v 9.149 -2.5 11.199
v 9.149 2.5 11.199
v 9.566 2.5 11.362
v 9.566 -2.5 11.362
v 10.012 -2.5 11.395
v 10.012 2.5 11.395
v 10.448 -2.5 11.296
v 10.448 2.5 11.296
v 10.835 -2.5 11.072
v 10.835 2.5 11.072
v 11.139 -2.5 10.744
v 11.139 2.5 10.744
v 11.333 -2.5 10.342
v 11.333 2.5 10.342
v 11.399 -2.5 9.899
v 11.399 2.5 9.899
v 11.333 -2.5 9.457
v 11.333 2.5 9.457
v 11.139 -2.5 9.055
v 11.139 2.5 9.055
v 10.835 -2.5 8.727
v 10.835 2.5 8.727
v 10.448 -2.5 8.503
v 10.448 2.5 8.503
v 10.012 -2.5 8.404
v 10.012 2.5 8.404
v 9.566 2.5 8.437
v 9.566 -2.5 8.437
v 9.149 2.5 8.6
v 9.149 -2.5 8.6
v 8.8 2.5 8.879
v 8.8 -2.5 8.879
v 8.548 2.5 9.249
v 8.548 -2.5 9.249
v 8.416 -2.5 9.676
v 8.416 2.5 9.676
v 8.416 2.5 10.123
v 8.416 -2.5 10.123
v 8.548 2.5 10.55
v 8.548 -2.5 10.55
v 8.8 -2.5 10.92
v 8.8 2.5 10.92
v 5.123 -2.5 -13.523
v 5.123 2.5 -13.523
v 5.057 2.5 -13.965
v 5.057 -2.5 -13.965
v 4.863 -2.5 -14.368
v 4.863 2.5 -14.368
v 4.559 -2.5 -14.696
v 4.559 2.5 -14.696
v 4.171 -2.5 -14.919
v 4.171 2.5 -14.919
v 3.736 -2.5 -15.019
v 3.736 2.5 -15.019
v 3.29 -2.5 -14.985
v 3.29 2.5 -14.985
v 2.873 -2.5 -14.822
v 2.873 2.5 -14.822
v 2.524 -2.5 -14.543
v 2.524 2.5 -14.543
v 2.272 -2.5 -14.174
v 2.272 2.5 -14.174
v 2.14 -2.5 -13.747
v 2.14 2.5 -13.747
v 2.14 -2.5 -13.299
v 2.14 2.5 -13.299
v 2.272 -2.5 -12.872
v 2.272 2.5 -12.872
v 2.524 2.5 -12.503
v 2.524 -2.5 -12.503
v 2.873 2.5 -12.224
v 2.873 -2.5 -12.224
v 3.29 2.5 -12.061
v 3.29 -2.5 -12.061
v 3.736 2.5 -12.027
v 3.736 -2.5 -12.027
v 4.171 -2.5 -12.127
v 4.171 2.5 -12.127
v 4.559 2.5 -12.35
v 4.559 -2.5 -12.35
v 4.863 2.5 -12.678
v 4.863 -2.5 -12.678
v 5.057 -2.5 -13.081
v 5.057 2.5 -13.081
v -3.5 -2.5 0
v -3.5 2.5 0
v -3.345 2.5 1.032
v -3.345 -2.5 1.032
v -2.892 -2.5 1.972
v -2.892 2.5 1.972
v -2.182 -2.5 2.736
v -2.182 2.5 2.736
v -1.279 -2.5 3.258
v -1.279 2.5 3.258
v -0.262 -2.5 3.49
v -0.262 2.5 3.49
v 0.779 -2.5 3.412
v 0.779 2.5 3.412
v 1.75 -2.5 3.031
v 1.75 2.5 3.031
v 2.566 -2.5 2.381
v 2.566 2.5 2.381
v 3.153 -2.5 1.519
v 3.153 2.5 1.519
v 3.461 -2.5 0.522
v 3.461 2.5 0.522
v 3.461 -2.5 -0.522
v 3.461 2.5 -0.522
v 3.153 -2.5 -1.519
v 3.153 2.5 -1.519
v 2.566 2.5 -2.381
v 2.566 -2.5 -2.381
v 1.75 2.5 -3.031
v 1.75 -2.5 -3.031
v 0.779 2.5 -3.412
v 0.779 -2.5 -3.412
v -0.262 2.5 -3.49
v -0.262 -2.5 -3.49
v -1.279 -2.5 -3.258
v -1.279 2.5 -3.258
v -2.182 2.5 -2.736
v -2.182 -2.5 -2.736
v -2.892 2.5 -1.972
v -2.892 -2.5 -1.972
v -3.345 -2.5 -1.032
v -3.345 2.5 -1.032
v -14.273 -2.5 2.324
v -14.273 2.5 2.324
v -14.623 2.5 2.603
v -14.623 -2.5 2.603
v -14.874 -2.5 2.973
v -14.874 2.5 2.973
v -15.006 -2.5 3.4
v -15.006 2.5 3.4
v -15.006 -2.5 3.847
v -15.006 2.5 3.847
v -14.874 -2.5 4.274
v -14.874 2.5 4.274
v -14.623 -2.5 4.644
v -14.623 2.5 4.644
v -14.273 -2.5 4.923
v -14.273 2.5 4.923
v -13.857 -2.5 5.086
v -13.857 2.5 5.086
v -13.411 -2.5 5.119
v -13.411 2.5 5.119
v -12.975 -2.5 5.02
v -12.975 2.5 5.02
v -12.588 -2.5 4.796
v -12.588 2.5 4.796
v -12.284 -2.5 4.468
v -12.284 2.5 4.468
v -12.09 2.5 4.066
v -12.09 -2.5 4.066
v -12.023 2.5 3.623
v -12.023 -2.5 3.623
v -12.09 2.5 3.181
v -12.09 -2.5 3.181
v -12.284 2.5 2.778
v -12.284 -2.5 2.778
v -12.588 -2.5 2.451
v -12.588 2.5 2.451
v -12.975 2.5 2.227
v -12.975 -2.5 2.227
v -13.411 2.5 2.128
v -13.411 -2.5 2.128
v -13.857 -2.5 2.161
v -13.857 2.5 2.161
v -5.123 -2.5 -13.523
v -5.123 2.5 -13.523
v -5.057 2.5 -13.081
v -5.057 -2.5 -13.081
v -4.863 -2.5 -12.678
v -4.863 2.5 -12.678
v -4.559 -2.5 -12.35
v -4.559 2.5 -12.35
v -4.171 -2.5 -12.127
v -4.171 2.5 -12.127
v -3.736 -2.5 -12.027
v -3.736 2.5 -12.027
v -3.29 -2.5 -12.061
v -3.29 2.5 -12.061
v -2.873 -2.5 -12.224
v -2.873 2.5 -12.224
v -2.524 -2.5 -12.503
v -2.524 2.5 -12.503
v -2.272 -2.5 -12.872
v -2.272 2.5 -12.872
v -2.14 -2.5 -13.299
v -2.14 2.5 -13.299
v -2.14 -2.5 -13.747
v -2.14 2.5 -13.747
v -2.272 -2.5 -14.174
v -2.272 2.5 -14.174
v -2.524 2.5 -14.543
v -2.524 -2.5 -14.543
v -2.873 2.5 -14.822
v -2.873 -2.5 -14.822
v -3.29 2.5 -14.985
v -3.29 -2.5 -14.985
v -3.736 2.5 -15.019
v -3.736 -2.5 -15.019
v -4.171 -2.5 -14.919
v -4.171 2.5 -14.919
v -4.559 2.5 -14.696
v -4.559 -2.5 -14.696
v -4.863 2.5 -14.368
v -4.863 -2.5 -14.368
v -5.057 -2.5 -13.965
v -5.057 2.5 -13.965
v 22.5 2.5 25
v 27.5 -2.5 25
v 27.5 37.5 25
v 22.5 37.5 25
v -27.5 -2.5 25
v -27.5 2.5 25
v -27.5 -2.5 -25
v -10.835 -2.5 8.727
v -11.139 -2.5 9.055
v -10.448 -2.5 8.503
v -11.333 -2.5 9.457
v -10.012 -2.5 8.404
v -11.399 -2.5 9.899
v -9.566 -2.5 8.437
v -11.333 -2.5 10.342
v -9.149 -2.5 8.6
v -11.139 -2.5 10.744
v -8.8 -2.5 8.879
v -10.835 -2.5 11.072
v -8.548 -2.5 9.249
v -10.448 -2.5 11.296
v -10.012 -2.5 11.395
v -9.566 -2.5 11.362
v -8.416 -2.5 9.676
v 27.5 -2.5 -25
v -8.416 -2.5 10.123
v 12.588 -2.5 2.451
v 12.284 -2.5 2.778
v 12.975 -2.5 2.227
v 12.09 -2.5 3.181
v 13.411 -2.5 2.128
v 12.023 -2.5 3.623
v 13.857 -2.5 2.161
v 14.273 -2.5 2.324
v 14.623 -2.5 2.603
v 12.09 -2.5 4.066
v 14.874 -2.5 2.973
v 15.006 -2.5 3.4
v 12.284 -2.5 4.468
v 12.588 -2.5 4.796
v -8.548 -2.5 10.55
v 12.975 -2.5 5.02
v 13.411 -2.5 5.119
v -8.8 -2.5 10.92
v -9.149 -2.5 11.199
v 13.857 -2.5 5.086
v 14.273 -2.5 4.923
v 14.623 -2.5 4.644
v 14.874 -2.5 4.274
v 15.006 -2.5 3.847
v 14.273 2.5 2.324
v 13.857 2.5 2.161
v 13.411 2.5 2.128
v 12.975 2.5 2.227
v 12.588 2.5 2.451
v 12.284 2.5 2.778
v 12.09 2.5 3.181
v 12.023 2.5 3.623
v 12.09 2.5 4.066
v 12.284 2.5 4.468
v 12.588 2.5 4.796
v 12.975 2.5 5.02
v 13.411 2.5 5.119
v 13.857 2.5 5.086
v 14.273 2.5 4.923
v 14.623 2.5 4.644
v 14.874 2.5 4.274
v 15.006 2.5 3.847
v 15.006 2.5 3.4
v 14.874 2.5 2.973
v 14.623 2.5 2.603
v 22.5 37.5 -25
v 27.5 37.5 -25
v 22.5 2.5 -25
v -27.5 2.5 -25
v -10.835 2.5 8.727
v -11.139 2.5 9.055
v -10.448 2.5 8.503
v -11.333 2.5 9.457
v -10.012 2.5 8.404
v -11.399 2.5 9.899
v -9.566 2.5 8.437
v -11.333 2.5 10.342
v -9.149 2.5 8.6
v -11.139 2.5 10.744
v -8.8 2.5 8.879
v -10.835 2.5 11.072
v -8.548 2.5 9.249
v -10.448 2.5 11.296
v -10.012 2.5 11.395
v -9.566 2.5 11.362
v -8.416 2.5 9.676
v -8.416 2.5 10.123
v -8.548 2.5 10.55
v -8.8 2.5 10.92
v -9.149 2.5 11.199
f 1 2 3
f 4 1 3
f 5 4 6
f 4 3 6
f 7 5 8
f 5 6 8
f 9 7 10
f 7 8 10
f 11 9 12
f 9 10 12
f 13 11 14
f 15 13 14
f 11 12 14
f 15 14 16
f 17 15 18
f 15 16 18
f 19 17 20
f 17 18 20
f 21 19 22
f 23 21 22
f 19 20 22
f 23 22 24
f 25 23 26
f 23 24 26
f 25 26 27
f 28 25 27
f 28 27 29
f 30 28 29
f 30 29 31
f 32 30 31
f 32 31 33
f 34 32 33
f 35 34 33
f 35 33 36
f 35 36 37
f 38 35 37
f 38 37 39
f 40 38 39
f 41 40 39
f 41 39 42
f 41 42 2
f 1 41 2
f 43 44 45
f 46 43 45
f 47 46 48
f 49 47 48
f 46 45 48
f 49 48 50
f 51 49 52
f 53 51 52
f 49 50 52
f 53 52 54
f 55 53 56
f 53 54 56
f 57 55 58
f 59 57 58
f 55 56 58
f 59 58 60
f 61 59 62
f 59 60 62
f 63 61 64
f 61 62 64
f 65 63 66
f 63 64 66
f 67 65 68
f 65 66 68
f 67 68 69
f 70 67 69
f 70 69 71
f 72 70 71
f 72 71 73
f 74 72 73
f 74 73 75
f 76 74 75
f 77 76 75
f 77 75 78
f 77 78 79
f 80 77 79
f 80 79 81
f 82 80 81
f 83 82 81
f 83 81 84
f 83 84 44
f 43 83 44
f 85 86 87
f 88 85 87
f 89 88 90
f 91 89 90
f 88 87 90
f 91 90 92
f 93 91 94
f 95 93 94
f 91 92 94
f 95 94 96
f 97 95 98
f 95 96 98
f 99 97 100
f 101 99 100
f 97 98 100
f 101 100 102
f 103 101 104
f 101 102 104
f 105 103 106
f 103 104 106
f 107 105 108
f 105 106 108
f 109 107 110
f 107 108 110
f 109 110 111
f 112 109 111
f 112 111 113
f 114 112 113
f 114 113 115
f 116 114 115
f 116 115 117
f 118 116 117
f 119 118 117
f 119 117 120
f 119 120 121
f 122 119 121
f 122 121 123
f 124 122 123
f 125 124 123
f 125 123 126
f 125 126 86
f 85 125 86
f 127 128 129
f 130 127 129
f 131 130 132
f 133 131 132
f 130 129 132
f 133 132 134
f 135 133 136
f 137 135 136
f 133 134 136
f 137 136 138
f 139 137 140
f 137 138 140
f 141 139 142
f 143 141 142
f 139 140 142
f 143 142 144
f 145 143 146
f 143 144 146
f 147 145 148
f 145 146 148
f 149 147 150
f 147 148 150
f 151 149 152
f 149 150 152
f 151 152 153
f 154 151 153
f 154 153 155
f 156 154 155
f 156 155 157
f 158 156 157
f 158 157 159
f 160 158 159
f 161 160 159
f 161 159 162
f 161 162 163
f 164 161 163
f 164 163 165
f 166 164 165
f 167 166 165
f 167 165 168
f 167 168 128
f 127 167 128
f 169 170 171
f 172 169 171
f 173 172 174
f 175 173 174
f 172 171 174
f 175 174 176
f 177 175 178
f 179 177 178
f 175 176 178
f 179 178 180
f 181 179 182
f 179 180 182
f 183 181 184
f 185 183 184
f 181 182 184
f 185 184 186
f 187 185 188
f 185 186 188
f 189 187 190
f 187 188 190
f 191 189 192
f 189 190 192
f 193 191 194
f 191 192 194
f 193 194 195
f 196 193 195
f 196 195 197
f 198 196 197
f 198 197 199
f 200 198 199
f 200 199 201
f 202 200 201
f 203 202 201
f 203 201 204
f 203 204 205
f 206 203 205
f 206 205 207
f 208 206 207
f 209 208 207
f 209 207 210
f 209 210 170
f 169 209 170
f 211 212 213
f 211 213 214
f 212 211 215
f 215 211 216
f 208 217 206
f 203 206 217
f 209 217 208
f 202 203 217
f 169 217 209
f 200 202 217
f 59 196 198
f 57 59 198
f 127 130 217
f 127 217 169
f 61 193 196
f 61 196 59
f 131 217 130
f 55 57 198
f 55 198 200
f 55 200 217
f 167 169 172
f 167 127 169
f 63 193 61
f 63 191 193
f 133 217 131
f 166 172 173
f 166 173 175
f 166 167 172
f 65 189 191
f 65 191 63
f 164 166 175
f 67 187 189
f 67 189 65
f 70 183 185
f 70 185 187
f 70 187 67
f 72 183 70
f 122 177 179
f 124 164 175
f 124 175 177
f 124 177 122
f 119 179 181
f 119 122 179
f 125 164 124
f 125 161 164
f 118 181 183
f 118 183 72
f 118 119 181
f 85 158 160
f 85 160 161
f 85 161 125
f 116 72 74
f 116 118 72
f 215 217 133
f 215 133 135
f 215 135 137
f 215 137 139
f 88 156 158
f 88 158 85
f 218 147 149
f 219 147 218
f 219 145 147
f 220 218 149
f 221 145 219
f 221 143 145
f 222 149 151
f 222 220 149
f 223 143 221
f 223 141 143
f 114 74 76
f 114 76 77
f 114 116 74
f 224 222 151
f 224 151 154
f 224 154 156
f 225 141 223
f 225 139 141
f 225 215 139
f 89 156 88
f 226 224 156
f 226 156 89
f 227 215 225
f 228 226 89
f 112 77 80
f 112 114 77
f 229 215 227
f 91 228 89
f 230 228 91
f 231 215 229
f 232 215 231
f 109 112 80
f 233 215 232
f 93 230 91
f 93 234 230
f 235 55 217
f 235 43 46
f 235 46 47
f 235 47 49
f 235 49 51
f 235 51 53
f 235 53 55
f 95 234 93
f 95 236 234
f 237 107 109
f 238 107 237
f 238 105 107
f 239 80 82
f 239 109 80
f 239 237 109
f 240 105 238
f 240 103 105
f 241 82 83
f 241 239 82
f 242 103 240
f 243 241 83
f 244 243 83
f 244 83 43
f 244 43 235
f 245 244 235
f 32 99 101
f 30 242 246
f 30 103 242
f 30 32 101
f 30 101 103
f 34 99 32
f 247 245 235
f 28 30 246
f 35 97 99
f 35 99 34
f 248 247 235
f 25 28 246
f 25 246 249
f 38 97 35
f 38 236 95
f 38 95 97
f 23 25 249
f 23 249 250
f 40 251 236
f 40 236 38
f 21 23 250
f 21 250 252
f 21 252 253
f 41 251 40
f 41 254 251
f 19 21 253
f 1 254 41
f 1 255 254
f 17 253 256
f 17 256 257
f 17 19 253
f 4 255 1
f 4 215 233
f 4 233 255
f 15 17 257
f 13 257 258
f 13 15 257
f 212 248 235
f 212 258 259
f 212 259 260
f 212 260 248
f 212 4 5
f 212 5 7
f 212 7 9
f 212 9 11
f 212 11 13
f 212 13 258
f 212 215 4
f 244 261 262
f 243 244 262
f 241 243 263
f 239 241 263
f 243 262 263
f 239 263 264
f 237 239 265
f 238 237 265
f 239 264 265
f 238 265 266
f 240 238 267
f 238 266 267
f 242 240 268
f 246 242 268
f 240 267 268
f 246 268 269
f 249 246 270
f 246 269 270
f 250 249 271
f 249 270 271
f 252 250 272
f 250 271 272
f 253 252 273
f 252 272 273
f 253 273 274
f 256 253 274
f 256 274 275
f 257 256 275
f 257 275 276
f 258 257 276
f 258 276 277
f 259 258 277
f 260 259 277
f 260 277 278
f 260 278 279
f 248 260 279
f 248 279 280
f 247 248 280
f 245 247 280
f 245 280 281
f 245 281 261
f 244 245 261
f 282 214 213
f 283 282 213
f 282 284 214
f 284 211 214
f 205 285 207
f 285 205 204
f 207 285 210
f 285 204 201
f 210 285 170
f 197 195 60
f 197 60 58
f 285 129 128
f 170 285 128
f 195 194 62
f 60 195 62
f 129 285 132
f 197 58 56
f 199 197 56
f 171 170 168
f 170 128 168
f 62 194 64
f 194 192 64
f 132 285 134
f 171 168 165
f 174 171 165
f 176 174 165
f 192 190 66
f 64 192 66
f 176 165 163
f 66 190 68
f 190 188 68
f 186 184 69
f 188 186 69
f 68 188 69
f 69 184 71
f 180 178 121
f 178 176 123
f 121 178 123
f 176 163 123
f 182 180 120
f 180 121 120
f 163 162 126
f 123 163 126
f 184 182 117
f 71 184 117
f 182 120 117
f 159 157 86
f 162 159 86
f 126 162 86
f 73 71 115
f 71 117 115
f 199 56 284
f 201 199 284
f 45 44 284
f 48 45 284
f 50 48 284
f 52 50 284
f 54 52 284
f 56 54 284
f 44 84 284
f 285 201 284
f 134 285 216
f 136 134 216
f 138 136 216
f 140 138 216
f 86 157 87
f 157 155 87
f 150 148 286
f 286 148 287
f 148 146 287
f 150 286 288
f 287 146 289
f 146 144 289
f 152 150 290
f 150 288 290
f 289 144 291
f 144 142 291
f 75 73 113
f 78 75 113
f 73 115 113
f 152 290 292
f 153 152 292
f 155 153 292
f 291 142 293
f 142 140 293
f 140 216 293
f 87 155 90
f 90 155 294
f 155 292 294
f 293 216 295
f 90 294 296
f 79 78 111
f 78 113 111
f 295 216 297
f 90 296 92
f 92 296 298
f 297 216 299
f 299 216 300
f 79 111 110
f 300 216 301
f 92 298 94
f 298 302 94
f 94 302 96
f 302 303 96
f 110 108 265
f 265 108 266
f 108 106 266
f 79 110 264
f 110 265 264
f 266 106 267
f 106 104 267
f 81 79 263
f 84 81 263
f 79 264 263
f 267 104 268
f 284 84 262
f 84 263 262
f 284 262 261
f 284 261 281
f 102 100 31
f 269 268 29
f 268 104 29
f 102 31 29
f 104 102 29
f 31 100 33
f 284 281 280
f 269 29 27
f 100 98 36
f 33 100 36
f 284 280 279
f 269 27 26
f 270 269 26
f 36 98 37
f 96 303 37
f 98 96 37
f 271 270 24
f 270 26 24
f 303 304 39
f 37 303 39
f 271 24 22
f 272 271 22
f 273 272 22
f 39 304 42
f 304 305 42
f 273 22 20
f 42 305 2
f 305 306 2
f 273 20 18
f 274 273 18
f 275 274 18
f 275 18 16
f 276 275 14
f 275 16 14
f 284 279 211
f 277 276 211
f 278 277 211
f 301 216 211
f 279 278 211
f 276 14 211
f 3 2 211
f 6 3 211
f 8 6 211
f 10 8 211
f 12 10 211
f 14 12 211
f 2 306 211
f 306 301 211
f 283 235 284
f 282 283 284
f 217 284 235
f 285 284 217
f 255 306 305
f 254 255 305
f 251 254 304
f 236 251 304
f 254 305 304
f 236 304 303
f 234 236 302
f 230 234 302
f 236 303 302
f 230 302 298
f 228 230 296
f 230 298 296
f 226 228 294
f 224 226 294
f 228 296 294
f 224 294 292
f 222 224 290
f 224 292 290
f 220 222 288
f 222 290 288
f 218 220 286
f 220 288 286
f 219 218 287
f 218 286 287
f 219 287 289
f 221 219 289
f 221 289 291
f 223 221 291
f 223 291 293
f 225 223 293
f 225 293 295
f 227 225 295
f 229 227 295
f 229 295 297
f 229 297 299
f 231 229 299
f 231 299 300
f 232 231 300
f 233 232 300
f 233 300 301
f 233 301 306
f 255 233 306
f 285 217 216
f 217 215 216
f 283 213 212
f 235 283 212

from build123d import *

# Parameters (mm, degrees)
BOSS_EXTRUDE1_DEPTH = 25
SKETCH2_R           = 3.5
SKETCH2_R_2         = 1.5
CUT_EXTRUDE1_DEPTH  = 52.051444642
CIRPATTERN1_COUNT   = 3


with BuildPart() as part:
    # Sketch1 → Boss-Extrude1 (new, symmetric)
    with BuildSketch(Plane.XY):
        Polygon((22.5, -2.5), (-27.5, -2.5), (-27.5, 2.5), (22.5, 2.5), (22.5, 37.5), (27.5, 37.5), (27.5, -2.5), align=None)
    extrude(amount=BOSS_EXTRUDE1_DEPTH, both=True)

    # Sketch2 → Cut-Extrude1 (cut, through all)
    with BuildSketch(Plane(origin=(0, 2.5, 0), x_dir=(1, 0, 0), z_dir=(0, 1, 0))):
        with Locations(Location((0, 0, 0), (0, 0, 180))):
            Circle(SKETCH2_R)
        with Locations(Location((-3.623466631, 13.522961568, 0), (0, 0, 180))):
            Circle(SKETCH2_R_2)
        with Locations((3.623466631, 13.522961568)):
            Circle(SKETCH2_R_2)
    cut_extrude1 = extrude(amount=-CUT_EXTRUDE1_DEPTH, mode=Mode.SUBTRACT)

    # CirPattern1: Cut-Extrude1 ×3 about axis
    cirpattern1_axis = Axis((0, 0, 0), (0, 1, 0))
    for i in range(1, CIRPATTERN1_COUNT):
        add(cut_extrude1.rotate(cirpattern1_axis, i * 360 / CIRPATTERN1_COUNT), mode=Mode.SUBTRACT)


solid = part.part
